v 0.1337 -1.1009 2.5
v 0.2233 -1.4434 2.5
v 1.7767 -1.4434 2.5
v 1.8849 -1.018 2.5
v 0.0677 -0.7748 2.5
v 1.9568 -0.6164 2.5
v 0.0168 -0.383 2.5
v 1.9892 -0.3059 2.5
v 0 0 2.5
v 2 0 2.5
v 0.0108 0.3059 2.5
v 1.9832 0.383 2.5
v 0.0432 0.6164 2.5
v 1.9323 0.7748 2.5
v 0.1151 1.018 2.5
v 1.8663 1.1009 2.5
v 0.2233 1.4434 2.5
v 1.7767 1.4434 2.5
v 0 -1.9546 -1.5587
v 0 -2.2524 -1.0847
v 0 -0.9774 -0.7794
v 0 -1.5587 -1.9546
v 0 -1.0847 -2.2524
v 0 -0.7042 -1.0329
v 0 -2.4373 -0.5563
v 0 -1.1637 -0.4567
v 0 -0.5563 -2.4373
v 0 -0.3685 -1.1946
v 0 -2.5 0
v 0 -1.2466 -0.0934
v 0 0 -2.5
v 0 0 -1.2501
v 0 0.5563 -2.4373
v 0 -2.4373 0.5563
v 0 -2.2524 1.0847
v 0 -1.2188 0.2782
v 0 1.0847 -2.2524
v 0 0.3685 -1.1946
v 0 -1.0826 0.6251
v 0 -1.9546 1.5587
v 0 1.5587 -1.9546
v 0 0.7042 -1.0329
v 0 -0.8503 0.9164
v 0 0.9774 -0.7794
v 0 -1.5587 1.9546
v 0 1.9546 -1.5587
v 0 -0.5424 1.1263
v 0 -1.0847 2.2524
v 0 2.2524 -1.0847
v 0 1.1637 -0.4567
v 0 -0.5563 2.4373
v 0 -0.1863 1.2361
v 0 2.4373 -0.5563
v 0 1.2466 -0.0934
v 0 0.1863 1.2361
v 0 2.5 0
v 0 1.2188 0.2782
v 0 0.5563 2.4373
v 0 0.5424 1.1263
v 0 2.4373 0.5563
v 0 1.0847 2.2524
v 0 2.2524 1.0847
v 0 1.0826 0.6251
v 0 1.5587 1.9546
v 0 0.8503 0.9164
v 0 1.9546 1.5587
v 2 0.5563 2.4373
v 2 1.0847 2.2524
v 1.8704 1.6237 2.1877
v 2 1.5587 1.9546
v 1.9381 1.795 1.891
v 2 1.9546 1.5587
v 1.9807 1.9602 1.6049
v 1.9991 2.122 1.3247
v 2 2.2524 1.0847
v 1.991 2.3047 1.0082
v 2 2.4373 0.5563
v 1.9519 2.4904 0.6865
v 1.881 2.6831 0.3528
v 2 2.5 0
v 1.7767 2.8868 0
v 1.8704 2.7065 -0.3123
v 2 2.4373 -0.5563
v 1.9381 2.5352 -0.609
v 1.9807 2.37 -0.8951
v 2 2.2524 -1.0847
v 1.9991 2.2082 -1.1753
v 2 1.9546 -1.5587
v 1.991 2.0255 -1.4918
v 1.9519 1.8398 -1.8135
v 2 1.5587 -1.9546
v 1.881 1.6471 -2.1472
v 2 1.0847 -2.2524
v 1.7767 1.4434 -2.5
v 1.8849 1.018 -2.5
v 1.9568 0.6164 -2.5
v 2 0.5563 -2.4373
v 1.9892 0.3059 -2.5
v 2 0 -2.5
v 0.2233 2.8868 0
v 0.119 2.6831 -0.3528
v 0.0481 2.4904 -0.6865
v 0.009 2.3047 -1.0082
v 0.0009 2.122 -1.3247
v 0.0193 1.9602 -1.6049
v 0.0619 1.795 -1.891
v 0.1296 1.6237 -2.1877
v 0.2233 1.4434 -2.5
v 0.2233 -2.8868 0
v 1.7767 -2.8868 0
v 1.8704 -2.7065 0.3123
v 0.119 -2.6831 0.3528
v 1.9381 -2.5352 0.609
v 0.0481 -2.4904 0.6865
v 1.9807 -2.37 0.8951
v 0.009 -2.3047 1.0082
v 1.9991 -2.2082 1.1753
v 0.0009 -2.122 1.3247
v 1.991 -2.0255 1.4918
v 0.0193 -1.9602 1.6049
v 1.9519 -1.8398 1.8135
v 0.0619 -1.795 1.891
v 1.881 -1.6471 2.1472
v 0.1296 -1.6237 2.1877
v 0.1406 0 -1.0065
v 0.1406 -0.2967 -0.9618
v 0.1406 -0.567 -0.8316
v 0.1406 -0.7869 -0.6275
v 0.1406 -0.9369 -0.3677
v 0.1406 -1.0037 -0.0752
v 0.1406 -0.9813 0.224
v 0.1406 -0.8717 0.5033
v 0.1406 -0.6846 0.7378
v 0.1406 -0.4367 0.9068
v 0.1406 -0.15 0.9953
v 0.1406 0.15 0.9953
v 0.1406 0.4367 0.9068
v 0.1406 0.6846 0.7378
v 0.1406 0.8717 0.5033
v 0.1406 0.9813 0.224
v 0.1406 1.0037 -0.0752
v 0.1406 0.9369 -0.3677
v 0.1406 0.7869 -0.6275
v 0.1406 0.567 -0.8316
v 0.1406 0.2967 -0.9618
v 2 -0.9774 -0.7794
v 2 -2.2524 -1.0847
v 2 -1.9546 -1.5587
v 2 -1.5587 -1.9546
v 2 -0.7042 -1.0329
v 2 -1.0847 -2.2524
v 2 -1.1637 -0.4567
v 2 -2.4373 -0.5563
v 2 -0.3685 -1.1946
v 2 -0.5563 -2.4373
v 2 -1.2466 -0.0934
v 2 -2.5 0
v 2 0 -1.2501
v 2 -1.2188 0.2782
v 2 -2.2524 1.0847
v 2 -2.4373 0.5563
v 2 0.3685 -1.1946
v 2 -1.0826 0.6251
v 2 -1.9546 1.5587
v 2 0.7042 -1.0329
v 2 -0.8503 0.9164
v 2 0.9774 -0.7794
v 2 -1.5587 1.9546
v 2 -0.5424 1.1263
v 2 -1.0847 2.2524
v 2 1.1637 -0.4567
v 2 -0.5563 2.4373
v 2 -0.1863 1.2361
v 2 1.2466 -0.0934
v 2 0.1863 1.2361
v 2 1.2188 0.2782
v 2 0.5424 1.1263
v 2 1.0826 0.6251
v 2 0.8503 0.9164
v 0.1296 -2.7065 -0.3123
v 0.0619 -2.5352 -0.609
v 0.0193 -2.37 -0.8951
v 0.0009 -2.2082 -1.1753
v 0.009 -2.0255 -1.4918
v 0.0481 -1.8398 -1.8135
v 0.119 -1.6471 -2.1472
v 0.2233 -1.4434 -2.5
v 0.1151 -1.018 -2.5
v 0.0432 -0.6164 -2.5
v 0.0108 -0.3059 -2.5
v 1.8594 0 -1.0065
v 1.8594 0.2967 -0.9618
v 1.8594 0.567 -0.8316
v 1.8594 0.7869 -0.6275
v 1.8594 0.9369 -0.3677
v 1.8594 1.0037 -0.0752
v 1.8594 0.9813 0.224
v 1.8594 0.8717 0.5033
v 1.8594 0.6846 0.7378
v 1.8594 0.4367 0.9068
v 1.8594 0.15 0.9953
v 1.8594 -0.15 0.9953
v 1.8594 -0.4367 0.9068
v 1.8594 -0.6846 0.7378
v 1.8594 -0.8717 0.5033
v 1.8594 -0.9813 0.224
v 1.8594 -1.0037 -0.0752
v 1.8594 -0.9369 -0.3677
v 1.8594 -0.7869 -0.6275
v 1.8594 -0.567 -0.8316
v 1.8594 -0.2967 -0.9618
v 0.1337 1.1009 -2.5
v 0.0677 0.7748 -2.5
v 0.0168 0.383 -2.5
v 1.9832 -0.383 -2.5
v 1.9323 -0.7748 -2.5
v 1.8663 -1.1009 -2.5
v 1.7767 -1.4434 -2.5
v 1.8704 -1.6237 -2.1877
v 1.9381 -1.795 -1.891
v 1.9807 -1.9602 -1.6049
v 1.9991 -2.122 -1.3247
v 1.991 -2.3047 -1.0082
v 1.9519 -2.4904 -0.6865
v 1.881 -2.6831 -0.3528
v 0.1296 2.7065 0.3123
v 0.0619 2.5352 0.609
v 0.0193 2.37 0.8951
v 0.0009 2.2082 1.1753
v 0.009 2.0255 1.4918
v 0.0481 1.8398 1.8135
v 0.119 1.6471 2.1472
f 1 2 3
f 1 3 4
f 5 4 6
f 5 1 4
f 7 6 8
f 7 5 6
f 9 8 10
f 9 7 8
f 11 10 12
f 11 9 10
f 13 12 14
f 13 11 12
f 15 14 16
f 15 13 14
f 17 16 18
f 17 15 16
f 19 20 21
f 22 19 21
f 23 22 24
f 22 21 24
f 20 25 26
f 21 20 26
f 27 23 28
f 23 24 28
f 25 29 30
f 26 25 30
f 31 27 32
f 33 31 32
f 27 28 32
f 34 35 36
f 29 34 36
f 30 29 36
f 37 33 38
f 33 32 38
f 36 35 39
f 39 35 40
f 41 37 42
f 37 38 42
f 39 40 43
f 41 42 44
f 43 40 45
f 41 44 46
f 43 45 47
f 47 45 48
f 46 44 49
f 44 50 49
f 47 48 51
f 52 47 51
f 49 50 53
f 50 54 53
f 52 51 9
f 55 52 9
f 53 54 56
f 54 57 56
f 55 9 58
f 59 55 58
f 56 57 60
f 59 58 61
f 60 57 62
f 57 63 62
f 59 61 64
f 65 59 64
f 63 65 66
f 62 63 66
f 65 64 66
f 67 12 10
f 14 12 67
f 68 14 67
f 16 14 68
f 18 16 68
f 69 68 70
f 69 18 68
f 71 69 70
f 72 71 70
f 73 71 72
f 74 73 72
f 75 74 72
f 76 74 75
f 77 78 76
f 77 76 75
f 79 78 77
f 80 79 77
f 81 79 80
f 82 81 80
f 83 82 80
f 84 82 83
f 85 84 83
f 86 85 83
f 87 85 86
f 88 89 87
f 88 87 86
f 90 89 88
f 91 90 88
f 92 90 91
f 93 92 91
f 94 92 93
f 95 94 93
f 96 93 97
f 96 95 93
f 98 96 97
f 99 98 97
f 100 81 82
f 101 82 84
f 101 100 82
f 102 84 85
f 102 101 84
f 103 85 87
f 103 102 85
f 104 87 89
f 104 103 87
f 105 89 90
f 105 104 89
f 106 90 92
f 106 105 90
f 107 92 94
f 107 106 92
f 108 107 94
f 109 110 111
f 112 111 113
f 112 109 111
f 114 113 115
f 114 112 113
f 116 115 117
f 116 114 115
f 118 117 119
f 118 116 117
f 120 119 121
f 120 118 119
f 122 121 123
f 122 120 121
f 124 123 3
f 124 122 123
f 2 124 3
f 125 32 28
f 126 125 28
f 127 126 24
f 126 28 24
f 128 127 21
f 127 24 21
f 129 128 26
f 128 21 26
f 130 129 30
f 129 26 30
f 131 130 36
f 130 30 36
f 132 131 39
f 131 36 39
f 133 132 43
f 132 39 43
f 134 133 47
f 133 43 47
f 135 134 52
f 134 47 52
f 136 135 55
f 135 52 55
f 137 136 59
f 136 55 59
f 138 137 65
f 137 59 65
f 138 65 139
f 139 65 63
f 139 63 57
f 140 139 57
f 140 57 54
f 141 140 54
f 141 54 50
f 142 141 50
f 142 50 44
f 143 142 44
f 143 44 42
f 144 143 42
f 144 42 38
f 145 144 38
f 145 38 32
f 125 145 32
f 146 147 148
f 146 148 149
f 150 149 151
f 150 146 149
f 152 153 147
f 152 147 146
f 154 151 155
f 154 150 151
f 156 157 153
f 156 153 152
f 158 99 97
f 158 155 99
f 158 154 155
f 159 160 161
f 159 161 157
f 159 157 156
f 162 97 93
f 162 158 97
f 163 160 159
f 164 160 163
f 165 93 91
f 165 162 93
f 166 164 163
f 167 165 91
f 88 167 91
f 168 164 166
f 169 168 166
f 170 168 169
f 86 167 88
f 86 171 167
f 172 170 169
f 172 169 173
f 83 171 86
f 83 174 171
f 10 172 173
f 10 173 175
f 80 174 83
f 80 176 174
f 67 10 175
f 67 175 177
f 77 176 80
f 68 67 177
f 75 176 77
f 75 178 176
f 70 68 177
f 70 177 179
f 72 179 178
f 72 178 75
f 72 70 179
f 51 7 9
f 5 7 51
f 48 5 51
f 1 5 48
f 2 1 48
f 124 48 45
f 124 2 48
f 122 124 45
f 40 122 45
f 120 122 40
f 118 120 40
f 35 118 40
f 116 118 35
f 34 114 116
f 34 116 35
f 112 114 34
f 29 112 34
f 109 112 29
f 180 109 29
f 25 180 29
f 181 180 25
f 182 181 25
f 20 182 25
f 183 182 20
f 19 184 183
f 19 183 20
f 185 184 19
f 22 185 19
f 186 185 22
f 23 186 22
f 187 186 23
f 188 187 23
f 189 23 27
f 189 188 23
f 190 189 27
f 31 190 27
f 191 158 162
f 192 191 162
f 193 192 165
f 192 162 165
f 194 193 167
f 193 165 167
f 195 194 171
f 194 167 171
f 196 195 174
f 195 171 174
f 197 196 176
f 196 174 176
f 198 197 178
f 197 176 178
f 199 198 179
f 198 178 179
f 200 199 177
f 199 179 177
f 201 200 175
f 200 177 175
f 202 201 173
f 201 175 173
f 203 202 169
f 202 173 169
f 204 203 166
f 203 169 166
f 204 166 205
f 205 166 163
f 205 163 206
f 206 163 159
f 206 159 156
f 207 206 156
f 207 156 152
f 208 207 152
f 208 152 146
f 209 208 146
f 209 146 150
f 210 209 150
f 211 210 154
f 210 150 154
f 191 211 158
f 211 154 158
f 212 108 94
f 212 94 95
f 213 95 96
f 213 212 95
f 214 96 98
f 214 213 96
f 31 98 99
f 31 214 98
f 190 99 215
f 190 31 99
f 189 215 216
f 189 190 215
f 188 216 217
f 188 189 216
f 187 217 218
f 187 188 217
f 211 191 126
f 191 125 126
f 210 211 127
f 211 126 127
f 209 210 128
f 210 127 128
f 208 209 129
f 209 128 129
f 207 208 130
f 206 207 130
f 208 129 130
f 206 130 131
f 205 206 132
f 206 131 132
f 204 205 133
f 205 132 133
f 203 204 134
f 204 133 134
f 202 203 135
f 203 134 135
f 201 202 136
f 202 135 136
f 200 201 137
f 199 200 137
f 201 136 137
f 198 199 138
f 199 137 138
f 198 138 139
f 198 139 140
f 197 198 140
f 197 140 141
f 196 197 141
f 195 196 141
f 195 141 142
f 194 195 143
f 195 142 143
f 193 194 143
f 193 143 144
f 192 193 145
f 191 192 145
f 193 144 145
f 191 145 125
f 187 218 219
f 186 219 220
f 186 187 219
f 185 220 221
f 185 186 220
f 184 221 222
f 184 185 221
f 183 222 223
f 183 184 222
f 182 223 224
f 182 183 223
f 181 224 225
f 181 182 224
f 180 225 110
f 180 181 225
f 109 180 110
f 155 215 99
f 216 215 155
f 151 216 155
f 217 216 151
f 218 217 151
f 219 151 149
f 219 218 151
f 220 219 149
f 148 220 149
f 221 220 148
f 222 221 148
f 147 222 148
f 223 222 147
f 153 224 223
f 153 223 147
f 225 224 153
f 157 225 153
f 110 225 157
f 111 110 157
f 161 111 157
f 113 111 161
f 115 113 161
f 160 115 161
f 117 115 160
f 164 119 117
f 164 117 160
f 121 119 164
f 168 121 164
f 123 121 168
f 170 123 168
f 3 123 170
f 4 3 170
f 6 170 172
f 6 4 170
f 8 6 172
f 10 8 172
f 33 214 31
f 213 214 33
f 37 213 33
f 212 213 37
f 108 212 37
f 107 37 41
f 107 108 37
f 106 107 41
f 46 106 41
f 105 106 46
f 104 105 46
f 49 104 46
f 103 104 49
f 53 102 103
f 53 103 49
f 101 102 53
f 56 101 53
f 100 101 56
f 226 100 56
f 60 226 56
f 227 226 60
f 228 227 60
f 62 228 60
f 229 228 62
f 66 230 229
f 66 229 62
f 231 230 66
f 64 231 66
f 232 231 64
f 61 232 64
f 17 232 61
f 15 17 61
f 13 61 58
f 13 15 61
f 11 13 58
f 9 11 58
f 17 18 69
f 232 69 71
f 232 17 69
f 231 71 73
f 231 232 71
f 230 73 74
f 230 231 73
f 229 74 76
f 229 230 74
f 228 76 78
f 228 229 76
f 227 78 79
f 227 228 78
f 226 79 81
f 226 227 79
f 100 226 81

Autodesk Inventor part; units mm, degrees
ref_plane "YZ Plane" through (0, 0, 0) normal (1, 0, 0) x (0, 1, 0)
ref_plane "XZ Plane" through (0, 0, 0) normal (0, 1, 0) x (-1, 0, 0)
sketch "Sketch1" plane through (0, 0, 0) normal (1, 0, 0) x (0, 1, 0)
  line L0 (-2.8868, 0) -> (-1.4434, 2.5)
  line L1 (-1.4434, 2.5) -> (1.4434, 2.5)
  line L2 (1.4434, 2.5) -> (2.8868, 0)
  line L3 (2.8868, 0) -> (1.4434, -2.5)
  line L4 (1.4434, -2.5) -> (-1.4434, -2.5)
  line L5 (-1.4434, -2.5) -> (-2.8868, 0)
  point P0 (0, 0)
  point P1 (0, 0)
  dimension "d0" = 5.7735
extrude "Body" add sketch "Sketch1" along normal blind 2
sketch "Sketch2" plane through (0, 0, 0) normal (0, 0, 1) x (1, 0, 0)
  line L0 (0, 1.4434) -> (0, 2.8868) projected
  line L1 (0, 2.8868) -> (2, 2.8868) projected
  line L2 (2, 1.4434) -> (2, 2.8868) projected
  line L3 (-0.4, 0) -> (2.4, 0) projected
  line L4 (0.2233, 2.8868) -> (0, 2.5)
  line L5 (1.7767, 2.8868) -> (2, 2.5)
  dimension "d3" = 30
  dimension "d4" = 30
  dimension "d5" = 5
  dimension "d6" = 5
revolve "Chamfer1" cut sketch "Sketch2" angle 360 about axis through (-10, 0, 0) along (1, 0, 0)
sketch "Sketch3" plane through (2, 0, 0) normal (1, 0, 0) x (0, 0, -1)
  arc A0 (-1.25, -2.1651) -> (1.25, -2.1651) centre (0, 0) ccw projected
hole "Thread" at (2, 0, 0) direction (-1, 0, 0) diameter 2.013 end through all thread size "M2.5x0.45" class "6H" standard "ISO Metric profile"
chamfer "Chamfer2" distance 0.2436 angle 30 1 edges at (2, 0, 1.0065) measured on face at (2, -1.9906, -0.0404)
chamfer "Chamfer3" distance 0.2436 angle 30 1 edges at (0, 0, 1.0065) measured on face at (0, -1.9906, -0.0404)
ref_plane "Work Plane1" through (-5.8951, 0, 0) normal (0, -0.866, -0.5) x (1, 0, 0)
equation "\"d0\" = 1.1547 * SW"
equation "\"d1\" = KOH"
equation "\"d3\" = ANG1"
equation "\"d4\" = ANG2"
equation "\"d5\" = SW0"
equation "\"d6\" = SW01"
equation "\"d8\" = -0.5 * GD1 + 0.5 * NND"
equation "\"d40\" = -0.5 * GD1 + 0.5 * NND"
equation "\"d10\" = -0.5 * GD1 + 0.5 * NND"
equation "\"d41\" = -0.5 * GD1 + 0.5 * NND"
equation "\"ANG1\" = 30deg"
equation "\"ANG2\" = 30deg"
equation "\"NND\" = 2.5"
equation "\"KOH\" = 2"
equation "\"SW\" = 5"
equation "\"SW0\" = SW"
equation "\"SW01\" = SW"
equation "\"GUL\" = 0.541266 * PTC"
equation "\"WFT\" = 0"
equation "\"THREADDIA\" = 2.5"
equation "\"TOA\" = 30deg"
equation "\"PTC\" = 0.45"
equation "\"E0\" = 1.155 * SW"
equation "\"GAL\" = 0.541266 * PTC"
equation "\"GD1\" = 2.012861"
properties part number "AS 1112 - M2,5  Type 5" material "Steel, Mild"
